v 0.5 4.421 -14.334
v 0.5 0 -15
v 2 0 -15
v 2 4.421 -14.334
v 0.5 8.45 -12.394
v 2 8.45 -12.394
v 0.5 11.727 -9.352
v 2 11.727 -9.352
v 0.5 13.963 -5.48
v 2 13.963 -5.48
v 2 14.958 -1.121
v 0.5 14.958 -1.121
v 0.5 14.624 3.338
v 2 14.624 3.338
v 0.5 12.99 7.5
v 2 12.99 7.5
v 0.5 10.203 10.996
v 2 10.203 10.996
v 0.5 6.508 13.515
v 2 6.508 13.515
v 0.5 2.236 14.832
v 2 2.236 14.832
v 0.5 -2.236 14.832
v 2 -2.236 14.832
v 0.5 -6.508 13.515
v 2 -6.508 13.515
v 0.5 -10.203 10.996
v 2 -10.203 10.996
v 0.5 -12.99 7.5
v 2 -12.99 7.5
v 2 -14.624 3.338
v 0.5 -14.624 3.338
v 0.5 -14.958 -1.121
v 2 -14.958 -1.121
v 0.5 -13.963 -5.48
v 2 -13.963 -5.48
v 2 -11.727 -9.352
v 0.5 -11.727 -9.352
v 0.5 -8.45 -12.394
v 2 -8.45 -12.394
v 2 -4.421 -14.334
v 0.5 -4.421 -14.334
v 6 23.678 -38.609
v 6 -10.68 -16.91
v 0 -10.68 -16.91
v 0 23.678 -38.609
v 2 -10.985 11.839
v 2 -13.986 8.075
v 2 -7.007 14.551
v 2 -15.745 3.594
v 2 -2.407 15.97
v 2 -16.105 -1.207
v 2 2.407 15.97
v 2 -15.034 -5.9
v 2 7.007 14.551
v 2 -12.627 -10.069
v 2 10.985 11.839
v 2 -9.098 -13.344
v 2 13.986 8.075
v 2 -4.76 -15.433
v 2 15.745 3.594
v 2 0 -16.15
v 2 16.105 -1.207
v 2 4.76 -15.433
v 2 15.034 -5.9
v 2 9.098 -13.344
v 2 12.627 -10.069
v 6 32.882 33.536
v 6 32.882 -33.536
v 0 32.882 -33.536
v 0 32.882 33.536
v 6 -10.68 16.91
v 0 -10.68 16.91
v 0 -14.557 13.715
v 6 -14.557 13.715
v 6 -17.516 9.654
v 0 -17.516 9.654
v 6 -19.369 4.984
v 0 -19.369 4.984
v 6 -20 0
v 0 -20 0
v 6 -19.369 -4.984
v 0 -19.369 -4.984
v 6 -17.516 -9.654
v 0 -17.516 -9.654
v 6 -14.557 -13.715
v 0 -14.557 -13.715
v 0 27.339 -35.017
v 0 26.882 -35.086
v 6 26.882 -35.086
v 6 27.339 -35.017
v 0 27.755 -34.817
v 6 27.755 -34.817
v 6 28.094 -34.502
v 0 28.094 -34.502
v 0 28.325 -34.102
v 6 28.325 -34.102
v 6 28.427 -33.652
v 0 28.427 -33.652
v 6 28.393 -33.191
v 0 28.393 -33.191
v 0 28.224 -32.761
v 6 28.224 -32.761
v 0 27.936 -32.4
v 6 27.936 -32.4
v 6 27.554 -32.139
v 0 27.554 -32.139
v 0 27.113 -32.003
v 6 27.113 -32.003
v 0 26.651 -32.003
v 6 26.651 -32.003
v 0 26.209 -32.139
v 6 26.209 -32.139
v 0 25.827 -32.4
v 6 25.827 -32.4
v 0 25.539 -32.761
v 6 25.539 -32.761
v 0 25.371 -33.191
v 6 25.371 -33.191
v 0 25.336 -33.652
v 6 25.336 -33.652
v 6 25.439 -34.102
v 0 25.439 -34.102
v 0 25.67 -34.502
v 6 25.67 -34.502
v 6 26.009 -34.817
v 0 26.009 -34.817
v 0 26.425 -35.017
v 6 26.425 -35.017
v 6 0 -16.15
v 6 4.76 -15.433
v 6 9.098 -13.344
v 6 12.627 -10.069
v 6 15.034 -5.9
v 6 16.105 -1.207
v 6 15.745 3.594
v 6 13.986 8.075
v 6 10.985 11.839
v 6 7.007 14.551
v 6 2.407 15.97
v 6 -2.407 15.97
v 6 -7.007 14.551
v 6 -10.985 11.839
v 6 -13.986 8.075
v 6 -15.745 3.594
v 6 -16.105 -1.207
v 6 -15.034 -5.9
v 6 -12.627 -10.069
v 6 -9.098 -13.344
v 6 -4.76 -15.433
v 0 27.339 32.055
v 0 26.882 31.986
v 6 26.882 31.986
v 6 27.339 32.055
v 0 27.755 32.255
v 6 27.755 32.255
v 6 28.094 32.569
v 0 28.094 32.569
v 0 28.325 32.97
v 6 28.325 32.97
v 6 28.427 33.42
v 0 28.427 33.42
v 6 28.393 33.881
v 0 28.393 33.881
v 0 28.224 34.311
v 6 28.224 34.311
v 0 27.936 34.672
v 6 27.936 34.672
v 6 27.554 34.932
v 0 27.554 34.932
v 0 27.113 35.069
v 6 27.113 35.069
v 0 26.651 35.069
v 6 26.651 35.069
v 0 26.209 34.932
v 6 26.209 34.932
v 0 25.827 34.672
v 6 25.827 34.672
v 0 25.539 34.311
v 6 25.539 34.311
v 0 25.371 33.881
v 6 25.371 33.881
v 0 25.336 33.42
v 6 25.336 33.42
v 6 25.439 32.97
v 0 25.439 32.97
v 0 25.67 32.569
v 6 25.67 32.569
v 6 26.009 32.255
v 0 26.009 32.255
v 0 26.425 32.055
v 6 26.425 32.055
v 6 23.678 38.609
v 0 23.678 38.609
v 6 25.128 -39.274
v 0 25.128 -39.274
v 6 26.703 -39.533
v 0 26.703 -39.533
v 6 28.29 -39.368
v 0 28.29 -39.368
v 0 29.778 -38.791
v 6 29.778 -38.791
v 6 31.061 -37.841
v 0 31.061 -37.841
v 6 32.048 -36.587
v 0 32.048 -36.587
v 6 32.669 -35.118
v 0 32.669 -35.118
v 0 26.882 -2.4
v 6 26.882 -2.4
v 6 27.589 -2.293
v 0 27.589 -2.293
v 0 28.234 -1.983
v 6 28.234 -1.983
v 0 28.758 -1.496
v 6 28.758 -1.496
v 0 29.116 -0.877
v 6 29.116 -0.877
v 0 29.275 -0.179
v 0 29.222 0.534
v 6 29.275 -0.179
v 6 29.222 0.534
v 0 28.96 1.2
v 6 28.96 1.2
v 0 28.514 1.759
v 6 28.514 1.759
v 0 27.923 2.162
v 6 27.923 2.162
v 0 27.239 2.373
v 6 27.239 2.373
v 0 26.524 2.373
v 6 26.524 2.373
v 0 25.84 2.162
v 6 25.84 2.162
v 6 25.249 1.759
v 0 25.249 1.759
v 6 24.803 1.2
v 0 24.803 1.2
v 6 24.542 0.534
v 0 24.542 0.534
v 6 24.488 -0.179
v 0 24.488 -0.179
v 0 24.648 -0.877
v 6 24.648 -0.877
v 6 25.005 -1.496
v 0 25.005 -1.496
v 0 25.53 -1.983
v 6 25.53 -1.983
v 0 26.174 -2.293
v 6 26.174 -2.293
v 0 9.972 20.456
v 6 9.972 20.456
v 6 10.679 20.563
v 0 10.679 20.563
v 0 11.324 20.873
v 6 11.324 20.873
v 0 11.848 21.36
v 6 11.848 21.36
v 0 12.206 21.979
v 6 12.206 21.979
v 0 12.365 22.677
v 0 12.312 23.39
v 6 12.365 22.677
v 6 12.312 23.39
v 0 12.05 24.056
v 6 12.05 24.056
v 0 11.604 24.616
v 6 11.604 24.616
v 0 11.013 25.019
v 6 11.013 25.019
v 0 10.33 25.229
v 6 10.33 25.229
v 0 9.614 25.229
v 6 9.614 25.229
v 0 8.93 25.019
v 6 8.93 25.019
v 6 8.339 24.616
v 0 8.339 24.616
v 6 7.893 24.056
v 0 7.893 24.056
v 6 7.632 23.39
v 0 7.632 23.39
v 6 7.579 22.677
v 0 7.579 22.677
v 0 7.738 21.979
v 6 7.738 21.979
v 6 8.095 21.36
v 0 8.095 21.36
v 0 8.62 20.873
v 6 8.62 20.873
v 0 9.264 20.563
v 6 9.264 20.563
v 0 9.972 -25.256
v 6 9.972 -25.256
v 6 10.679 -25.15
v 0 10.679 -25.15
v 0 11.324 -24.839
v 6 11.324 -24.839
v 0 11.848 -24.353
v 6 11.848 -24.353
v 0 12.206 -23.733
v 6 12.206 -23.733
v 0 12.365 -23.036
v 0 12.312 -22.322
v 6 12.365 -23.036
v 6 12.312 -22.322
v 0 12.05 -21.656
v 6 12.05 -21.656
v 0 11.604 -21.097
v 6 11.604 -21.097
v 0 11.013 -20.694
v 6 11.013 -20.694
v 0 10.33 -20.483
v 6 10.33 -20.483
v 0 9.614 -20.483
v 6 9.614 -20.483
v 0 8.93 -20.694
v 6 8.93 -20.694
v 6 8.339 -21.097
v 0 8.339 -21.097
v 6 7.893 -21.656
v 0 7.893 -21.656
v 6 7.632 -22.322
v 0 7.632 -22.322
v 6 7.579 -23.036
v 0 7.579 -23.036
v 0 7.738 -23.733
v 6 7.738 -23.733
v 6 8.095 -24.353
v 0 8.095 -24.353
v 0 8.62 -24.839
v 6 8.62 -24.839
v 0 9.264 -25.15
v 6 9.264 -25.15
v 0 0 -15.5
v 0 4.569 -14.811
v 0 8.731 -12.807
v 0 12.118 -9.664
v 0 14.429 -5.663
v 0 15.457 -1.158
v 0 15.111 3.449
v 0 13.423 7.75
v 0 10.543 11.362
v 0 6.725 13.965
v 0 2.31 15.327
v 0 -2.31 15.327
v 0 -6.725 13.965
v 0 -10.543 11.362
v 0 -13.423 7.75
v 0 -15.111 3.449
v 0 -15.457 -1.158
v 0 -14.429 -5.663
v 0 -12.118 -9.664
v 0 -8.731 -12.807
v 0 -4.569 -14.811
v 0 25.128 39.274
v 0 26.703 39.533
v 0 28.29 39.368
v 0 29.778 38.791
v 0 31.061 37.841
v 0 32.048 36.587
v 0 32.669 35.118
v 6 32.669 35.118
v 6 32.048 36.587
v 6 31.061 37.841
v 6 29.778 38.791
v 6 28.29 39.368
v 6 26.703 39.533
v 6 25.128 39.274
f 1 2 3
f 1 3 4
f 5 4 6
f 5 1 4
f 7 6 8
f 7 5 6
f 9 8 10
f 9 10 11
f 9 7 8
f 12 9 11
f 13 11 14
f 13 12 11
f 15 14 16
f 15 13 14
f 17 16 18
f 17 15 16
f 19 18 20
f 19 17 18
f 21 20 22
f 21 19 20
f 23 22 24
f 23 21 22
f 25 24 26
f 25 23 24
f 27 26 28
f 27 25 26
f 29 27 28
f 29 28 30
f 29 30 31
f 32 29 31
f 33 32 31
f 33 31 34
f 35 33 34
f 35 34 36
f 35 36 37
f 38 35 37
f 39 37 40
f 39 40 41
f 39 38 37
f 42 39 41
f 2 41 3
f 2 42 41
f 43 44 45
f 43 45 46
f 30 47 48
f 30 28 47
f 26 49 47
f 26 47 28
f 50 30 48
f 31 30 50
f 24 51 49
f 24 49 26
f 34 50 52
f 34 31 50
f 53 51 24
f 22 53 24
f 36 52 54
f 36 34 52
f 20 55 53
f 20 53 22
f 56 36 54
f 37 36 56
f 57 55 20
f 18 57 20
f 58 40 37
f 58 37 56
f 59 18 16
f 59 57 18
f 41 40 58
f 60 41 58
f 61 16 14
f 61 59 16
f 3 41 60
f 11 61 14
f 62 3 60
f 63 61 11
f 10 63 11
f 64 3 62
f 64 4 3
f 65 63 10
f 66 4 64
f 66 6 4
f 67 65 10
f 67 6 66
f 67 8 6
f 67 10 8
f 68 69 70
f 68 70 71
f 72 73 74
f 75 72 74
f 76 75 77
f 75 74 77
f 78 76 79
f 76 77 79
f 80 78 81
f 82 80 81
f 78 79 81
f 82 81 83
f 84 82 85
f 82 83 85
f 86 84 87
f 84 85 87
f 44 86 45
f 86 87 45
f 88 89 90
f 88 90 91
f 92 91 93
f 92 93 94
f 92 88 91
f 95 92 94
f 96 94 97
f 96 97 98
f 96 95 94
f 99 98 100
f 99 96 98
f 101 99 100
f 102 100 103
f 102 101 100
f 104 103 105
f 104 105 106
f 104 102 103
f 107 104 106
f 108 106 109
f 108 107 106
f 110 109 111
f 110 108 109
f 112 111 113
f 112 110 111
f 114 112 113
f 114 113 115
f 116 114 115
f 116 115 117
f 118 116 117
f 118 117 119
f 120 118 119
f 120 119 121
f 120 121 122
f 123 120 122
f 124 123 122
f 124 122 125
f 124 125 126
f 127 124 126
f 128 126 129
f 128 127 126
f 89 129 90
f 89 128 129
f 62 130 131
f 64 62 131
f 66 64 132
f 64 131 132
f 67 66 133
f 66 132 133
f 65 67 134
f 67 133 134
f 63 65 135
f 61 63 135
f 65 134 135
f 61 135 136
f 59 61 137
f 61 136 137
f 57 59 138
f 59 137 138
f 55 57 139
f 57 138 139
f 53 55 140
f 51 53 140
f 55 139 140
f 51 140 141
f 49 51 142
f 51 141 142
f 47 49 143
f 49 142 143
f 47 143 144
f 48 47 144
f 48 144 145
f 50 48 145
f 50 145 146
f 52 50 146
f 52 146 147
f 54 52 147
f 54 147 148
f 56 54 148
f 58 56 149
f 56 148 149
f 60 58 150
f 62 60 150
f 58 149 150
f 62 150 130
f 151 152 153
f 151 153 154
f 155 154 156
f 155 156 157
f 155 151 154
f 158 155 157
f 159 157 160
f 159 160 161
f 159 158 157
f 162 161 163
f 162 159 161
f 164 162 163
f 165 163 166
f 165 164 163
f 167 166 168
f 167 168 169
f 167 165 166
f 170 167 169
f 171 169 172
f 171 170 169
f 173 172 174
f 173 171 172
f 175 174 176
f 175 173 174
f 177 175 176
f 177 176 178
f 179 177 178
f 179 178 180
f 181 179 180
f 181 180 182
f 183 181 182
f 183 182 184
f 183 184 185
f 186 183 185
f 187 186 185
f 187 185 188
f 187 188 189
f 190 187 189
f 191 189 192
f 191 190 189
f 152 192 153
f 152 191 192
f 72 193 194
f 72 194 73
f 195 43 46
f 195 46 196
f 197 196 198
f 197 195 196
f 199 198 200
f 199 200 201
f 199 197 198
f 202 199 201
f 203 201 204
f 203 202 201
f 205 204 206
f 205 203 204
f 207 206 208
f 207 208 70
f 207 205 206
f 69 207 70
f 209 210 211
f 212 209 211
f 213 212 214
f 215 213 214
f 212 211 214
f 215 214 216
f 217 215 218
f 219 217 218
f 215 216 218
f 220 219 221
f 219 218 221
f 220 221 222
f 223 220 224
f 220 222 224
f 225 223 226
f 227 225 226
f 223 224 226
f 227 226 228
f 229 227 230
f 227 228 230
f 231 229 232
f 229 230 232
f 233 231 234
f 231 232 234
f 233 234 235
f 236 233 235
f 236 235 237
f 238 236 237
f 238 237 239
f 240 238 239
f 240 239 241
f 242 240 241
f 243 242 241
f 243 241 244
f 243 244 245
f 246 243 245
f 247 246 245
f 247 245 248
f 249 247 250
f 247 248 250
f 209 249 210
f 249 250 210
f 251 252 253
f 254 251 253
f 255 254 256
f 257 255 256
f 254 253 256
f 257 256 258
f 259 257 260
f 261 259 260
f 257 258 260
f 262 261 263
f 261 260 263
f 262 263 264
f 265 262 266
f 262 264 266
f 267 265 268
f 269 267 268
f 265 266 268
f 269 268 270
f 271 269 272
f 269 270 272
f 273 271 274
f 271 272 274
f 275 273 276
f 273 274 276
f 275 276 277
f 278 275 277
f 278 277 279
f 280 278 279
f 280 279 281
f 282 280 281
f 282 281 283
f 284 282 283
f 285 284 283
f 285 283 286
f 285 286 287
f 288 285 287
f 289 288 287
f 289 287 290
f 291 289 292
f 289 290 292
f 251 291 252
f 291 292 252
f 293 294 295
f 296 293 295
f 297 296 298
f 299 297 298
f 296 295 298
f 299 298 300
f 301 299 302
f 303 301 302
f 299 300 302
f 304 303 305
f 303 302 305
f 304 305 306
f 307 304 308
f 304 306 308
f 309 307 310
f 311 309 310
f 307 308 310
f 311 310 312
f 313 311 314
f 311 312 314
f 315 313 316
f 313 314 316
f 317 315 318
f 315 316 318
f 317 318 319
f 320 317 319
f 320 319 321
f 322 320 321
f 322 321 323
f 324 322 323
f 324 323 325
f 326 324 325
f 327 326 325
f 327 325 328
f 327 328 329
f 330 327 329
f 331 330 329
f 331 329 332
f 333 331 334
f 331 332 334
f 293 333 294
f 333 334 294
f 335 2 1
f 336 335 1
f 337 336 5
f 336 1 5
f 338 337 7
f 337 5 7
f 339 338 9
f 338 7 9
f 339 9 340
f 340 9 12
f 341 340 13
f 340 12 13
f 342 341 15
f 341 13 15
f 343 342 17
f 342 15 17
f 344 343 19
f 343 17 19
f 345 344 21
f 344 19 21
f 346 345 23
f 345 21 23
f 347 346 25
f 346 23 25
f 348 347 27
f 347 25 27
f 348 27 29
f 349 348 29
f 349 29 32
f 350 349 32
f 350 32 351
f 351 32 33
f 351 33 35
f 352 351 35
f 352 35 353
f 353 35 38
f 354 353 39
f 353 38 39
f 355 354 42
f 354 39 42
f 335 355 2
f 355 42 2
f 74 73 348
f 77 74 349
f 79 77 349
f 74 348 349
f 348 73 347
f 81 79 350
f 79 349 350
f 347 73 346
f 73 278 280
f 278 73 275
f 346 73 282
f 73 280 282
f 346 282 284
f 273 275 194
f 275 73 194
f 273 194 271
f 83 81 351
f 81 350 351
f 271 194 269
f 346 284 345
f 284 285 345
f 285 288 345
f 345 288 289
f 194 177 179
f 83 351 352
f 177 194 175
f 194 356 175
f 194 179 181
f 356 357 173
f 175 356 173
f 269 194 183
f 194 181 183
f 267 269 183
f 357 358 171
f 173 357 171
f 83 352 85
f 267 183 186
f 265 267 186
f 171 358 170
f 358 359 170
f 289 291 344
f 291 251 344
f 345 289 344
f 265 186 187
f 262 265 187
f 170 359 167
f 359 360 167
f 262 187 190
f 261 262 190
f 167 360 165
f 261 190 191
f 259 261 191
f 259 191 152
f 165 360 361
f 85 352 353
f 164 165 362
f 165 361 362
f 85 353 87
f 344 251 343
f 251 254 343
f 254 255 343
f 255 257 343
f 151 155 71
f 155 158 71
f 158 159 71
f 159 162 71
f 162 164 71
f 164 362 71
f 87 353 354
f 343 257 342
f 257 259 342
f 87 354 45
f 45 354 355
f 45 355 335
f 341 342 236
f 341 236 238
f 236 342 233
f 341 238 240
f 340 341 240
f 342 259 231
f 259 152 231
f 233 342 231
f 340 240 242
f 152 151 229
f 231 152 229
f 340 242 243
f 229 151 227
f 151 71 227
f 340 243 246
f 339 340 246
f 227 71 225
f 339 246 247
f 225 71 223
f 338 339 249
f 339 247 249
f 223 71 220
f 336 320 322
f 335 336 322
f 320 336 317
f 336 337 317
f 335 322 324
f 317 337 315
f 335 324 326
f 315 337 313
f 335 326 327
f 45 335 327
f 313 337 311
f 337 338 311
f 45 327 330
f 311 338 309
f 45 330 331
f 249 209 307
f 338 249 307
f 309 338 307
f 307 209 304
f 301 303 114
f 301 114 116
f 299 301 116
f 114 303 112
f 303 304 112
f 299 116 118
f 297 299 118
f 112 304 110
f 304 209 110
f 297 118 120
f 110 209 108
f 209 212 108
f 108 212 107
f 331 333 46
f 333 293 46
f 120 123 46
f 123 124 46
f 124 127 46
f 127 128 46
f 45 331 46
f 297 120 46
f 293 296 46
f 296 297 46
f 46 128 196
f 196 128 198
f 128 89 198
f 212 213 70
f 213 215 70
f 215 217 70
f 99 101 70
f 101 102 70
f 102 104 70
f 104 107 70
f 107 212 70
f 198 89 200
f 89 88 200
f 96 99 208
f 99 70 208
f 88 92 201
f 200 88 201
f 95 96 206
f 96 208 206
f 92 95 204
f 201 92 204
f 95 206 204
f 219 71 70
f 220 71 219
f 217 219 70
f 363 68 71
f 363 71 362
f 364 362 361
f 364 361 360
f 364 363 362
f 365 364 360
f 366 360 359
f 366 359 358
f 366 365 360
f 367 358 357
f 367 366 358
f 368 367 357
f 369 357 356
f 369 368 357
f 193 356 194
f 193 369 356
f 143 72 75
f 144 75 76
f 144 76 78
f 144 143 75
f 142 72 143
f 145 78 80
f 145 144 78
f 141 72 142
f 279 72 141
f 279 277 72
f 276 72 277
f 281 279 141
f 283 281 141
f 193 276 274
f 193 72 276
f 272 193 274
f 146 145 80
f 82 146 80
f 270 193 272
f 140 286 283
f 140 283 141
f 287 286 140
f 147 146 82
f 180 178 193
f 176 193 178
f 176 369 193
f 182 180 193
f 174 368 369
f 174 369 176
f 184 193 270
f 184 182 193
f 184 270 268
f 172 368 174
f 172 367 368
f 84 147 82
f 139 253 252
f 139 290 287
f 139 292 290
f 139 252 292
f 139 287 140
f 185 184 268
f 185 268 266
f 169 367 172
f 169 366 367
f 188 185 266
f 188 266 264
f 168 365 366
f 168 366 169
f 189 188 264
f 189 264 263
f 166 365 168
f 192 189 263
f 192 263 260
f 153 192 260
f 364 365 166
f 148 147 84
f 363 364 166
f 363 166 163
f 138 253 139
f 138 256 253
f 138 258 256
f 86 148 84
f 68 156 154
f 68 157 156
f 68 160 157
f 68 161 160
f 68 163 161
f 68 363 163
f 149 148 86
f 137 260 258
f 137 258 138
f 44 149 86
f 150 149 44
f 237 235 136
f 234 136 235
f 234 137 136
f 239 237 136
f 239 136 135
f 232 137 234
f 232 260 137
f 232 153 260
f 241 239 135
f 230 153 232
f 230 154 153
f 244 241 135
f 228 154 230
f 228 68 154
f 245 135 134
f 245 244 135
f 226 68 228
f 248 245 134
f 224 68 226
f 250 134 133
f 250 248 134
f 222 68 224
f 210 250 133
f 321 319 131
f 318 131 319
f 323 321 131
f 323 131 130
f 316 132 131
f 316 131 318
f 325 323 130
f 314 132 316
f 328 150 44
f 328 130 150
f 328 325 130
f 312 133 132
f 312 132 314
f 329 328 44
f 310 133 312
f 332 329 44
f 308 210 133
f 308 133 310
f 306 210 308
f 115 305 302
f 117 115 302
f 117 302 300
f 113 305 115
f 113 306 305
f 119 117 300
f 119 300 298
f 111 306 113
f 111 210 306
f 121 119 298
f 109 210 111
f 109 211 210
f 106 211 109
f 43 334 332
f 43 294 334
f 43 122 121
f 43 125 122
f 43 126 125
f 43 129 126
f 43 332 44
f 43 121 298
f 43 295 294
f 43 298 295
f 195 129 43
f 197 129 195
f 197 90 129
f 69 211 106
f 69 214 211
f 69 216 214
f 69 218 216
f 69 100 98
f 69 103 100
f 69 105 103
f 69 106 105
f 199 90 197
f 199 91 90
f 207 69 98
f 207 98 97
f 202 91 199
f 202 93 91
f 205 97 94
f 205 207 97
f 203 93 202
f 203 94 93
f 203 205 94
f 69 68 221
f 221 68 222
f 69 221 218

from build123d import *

# Parameters (mm, degrees)
SKETCH1_R           = 20
SKETCH1_R_2         = 15
BOSS_EXTRUDE1_DEPTH = 2
SKETCH2_R           = 20
SKETCH2_R_2         = 16
BOSS_EXTRUDE2_DEPTH = 4
SKETCH3_R           = 2
BOSS_EXTRUDE3_DEPTH = 6
SKETCH4_R           = 2.4
CUT_EXTRUDE1_DEPTH  = 6
SKETCH5_R           = 2
SKETCH5_R_2         = 1.55
BOSS_EXTRUDE4_DEPTH = 6
SKETCH6_R           = 16.15
SKETCH6_R_2         = 16
CUT_EXTRUDE2_DEPTH  = 4
CHAMFER1_SIZE       = 0.5


with BuildPart() as part:
    # Sketch1 → Boss-Extrude1 (new body)
    with BuildSketch(Plane(origin=(0, 0, 0), x_dir=(0, 0, -1), z_dir=(1, 0, 0))):
        Circle(SKETCH1_R)
        Circle(SKETCH1_R_2, mode=Mode.SUBTRACT)
    extrude(amount=BOSS_EXTRUDE1_DEPTH)

    # Sketch2 → Boss-Extrude2 (add)
    with BuildSketch(Plane(origin=(2, 0, 0), x_dir=(0, 0, -1), z_dir=(1, 0, 0))):
        Circle(SKETCH2_R)
        Circle(SKETCH2_R_2, mode=Mode.SUBTRACT)
    extrude(amount=BOSS_EXTRUDE2_DEPTH)

    # Sketch3 → Boss-Extrude3 (add)
    with BuildSketch(Plane(origin=(6, 0, 0), x_dir=(0, 0, -1), z_dir=(1, 0, 0))):
        with BuildLine():
            Line((-38.608830959, 23.677807584), (-16.909895057, -10.679674581))
            ThreePointArc((-16.909895057, -10.679674581), (0, 20), (16.909895057, -10.679674581))
            Line((16.909895057, -10.679674581), (38.608830959, 23.677807584))
            ThreePointArc((38.608830959, 23.677807584), (38.790546744, 29.777964933), (33.535862442, 32.881709959))
            Line((33.535862442, 32.881709959), (-33.535862442, 32.881709959))
            ThreePointArc((-33.535862442, 32.881709959), (-38.790546744, 29.777964933), (-38.608830959, 23.677807584))
        make_face()
        with Locations((-33.535862442, 26.881709959)):
            Circle(SKETCH3_R, mode=Mode.SUBTRACT)
        with Locations((33.535862442, 26.881709959)):
            Circle(SKETCH3_R, mode=Mode.SUBTRACT)
    extrude(amount=-BOSS_EXTRUDE3_DEPTH)

    # Sketch4 → Cut-Extrude1 (cut)
    with BuildSketch(Plane(origin=(6, 0, 0), x_dir=(0, 0, -1), z_dir=(1, 0, 0))):
        with Locations((-22.856187861, 9.971814902)):
            Circle(SKETCH4_R)
        with Locations((22.856187861, 9.971814902)):
            Circle(SKETCH4_R)
        with Locations((0, 26.881709959)):
            Circle(SKETCH4_R)
    extrude(amount=-CUT_EXTRUDE1_DEPTH, mode=Mode.SUBTRACT)

    # Sketch5 → Boss-Extrude4 (add)
    with BuildSketch(Plane(origin=(0, 0, 0), x_dir=(0, 0, -1), z_dir=(1, 0, 0))):
        with Locations((33.535862442, 26.881709959)):
            Circle(SKETCH5_R)
        with Locations((33.535862442, 26.881709959)):
            Circle(SKETCH5_R_2, mode=Mode.SUBTRACT)
        with Locations((-33.535862442, 26.881709959)):
            Circle(SKETCH5_R)
        with Locations((-33.535862442, 26.881709959)):
            Circle(SKETCH5_R_2, mode=Mode.SUBTRACT)
    extrude(amount=BOSS_EXTRUDE4_DEPTH)

    # Sketch6 → Cut-Extrude2 (cut)
    with BuildSketch(Plane(origin=(6, 0, 0), x_dir=(0, 0, -1), z_dir=(1, 0, 0))):
        Circle(SKETCH6_R)
        Circle(SKETCH6_R_2, mode=Mode.SUBTRACT)
    extrude(amount=-CUT_EXTRUDE2_DEPTH, mode=Mode.SUBTRACT)

    # Chamfer1
    chamfer1_edges = [part.edges().sort_by_distance(p)[0] for p in [
        (0, 0, 15),
    ]]
    chamfer(chamfer1_edges, length=CHAMFER1_SIZE)


solid = part.part
